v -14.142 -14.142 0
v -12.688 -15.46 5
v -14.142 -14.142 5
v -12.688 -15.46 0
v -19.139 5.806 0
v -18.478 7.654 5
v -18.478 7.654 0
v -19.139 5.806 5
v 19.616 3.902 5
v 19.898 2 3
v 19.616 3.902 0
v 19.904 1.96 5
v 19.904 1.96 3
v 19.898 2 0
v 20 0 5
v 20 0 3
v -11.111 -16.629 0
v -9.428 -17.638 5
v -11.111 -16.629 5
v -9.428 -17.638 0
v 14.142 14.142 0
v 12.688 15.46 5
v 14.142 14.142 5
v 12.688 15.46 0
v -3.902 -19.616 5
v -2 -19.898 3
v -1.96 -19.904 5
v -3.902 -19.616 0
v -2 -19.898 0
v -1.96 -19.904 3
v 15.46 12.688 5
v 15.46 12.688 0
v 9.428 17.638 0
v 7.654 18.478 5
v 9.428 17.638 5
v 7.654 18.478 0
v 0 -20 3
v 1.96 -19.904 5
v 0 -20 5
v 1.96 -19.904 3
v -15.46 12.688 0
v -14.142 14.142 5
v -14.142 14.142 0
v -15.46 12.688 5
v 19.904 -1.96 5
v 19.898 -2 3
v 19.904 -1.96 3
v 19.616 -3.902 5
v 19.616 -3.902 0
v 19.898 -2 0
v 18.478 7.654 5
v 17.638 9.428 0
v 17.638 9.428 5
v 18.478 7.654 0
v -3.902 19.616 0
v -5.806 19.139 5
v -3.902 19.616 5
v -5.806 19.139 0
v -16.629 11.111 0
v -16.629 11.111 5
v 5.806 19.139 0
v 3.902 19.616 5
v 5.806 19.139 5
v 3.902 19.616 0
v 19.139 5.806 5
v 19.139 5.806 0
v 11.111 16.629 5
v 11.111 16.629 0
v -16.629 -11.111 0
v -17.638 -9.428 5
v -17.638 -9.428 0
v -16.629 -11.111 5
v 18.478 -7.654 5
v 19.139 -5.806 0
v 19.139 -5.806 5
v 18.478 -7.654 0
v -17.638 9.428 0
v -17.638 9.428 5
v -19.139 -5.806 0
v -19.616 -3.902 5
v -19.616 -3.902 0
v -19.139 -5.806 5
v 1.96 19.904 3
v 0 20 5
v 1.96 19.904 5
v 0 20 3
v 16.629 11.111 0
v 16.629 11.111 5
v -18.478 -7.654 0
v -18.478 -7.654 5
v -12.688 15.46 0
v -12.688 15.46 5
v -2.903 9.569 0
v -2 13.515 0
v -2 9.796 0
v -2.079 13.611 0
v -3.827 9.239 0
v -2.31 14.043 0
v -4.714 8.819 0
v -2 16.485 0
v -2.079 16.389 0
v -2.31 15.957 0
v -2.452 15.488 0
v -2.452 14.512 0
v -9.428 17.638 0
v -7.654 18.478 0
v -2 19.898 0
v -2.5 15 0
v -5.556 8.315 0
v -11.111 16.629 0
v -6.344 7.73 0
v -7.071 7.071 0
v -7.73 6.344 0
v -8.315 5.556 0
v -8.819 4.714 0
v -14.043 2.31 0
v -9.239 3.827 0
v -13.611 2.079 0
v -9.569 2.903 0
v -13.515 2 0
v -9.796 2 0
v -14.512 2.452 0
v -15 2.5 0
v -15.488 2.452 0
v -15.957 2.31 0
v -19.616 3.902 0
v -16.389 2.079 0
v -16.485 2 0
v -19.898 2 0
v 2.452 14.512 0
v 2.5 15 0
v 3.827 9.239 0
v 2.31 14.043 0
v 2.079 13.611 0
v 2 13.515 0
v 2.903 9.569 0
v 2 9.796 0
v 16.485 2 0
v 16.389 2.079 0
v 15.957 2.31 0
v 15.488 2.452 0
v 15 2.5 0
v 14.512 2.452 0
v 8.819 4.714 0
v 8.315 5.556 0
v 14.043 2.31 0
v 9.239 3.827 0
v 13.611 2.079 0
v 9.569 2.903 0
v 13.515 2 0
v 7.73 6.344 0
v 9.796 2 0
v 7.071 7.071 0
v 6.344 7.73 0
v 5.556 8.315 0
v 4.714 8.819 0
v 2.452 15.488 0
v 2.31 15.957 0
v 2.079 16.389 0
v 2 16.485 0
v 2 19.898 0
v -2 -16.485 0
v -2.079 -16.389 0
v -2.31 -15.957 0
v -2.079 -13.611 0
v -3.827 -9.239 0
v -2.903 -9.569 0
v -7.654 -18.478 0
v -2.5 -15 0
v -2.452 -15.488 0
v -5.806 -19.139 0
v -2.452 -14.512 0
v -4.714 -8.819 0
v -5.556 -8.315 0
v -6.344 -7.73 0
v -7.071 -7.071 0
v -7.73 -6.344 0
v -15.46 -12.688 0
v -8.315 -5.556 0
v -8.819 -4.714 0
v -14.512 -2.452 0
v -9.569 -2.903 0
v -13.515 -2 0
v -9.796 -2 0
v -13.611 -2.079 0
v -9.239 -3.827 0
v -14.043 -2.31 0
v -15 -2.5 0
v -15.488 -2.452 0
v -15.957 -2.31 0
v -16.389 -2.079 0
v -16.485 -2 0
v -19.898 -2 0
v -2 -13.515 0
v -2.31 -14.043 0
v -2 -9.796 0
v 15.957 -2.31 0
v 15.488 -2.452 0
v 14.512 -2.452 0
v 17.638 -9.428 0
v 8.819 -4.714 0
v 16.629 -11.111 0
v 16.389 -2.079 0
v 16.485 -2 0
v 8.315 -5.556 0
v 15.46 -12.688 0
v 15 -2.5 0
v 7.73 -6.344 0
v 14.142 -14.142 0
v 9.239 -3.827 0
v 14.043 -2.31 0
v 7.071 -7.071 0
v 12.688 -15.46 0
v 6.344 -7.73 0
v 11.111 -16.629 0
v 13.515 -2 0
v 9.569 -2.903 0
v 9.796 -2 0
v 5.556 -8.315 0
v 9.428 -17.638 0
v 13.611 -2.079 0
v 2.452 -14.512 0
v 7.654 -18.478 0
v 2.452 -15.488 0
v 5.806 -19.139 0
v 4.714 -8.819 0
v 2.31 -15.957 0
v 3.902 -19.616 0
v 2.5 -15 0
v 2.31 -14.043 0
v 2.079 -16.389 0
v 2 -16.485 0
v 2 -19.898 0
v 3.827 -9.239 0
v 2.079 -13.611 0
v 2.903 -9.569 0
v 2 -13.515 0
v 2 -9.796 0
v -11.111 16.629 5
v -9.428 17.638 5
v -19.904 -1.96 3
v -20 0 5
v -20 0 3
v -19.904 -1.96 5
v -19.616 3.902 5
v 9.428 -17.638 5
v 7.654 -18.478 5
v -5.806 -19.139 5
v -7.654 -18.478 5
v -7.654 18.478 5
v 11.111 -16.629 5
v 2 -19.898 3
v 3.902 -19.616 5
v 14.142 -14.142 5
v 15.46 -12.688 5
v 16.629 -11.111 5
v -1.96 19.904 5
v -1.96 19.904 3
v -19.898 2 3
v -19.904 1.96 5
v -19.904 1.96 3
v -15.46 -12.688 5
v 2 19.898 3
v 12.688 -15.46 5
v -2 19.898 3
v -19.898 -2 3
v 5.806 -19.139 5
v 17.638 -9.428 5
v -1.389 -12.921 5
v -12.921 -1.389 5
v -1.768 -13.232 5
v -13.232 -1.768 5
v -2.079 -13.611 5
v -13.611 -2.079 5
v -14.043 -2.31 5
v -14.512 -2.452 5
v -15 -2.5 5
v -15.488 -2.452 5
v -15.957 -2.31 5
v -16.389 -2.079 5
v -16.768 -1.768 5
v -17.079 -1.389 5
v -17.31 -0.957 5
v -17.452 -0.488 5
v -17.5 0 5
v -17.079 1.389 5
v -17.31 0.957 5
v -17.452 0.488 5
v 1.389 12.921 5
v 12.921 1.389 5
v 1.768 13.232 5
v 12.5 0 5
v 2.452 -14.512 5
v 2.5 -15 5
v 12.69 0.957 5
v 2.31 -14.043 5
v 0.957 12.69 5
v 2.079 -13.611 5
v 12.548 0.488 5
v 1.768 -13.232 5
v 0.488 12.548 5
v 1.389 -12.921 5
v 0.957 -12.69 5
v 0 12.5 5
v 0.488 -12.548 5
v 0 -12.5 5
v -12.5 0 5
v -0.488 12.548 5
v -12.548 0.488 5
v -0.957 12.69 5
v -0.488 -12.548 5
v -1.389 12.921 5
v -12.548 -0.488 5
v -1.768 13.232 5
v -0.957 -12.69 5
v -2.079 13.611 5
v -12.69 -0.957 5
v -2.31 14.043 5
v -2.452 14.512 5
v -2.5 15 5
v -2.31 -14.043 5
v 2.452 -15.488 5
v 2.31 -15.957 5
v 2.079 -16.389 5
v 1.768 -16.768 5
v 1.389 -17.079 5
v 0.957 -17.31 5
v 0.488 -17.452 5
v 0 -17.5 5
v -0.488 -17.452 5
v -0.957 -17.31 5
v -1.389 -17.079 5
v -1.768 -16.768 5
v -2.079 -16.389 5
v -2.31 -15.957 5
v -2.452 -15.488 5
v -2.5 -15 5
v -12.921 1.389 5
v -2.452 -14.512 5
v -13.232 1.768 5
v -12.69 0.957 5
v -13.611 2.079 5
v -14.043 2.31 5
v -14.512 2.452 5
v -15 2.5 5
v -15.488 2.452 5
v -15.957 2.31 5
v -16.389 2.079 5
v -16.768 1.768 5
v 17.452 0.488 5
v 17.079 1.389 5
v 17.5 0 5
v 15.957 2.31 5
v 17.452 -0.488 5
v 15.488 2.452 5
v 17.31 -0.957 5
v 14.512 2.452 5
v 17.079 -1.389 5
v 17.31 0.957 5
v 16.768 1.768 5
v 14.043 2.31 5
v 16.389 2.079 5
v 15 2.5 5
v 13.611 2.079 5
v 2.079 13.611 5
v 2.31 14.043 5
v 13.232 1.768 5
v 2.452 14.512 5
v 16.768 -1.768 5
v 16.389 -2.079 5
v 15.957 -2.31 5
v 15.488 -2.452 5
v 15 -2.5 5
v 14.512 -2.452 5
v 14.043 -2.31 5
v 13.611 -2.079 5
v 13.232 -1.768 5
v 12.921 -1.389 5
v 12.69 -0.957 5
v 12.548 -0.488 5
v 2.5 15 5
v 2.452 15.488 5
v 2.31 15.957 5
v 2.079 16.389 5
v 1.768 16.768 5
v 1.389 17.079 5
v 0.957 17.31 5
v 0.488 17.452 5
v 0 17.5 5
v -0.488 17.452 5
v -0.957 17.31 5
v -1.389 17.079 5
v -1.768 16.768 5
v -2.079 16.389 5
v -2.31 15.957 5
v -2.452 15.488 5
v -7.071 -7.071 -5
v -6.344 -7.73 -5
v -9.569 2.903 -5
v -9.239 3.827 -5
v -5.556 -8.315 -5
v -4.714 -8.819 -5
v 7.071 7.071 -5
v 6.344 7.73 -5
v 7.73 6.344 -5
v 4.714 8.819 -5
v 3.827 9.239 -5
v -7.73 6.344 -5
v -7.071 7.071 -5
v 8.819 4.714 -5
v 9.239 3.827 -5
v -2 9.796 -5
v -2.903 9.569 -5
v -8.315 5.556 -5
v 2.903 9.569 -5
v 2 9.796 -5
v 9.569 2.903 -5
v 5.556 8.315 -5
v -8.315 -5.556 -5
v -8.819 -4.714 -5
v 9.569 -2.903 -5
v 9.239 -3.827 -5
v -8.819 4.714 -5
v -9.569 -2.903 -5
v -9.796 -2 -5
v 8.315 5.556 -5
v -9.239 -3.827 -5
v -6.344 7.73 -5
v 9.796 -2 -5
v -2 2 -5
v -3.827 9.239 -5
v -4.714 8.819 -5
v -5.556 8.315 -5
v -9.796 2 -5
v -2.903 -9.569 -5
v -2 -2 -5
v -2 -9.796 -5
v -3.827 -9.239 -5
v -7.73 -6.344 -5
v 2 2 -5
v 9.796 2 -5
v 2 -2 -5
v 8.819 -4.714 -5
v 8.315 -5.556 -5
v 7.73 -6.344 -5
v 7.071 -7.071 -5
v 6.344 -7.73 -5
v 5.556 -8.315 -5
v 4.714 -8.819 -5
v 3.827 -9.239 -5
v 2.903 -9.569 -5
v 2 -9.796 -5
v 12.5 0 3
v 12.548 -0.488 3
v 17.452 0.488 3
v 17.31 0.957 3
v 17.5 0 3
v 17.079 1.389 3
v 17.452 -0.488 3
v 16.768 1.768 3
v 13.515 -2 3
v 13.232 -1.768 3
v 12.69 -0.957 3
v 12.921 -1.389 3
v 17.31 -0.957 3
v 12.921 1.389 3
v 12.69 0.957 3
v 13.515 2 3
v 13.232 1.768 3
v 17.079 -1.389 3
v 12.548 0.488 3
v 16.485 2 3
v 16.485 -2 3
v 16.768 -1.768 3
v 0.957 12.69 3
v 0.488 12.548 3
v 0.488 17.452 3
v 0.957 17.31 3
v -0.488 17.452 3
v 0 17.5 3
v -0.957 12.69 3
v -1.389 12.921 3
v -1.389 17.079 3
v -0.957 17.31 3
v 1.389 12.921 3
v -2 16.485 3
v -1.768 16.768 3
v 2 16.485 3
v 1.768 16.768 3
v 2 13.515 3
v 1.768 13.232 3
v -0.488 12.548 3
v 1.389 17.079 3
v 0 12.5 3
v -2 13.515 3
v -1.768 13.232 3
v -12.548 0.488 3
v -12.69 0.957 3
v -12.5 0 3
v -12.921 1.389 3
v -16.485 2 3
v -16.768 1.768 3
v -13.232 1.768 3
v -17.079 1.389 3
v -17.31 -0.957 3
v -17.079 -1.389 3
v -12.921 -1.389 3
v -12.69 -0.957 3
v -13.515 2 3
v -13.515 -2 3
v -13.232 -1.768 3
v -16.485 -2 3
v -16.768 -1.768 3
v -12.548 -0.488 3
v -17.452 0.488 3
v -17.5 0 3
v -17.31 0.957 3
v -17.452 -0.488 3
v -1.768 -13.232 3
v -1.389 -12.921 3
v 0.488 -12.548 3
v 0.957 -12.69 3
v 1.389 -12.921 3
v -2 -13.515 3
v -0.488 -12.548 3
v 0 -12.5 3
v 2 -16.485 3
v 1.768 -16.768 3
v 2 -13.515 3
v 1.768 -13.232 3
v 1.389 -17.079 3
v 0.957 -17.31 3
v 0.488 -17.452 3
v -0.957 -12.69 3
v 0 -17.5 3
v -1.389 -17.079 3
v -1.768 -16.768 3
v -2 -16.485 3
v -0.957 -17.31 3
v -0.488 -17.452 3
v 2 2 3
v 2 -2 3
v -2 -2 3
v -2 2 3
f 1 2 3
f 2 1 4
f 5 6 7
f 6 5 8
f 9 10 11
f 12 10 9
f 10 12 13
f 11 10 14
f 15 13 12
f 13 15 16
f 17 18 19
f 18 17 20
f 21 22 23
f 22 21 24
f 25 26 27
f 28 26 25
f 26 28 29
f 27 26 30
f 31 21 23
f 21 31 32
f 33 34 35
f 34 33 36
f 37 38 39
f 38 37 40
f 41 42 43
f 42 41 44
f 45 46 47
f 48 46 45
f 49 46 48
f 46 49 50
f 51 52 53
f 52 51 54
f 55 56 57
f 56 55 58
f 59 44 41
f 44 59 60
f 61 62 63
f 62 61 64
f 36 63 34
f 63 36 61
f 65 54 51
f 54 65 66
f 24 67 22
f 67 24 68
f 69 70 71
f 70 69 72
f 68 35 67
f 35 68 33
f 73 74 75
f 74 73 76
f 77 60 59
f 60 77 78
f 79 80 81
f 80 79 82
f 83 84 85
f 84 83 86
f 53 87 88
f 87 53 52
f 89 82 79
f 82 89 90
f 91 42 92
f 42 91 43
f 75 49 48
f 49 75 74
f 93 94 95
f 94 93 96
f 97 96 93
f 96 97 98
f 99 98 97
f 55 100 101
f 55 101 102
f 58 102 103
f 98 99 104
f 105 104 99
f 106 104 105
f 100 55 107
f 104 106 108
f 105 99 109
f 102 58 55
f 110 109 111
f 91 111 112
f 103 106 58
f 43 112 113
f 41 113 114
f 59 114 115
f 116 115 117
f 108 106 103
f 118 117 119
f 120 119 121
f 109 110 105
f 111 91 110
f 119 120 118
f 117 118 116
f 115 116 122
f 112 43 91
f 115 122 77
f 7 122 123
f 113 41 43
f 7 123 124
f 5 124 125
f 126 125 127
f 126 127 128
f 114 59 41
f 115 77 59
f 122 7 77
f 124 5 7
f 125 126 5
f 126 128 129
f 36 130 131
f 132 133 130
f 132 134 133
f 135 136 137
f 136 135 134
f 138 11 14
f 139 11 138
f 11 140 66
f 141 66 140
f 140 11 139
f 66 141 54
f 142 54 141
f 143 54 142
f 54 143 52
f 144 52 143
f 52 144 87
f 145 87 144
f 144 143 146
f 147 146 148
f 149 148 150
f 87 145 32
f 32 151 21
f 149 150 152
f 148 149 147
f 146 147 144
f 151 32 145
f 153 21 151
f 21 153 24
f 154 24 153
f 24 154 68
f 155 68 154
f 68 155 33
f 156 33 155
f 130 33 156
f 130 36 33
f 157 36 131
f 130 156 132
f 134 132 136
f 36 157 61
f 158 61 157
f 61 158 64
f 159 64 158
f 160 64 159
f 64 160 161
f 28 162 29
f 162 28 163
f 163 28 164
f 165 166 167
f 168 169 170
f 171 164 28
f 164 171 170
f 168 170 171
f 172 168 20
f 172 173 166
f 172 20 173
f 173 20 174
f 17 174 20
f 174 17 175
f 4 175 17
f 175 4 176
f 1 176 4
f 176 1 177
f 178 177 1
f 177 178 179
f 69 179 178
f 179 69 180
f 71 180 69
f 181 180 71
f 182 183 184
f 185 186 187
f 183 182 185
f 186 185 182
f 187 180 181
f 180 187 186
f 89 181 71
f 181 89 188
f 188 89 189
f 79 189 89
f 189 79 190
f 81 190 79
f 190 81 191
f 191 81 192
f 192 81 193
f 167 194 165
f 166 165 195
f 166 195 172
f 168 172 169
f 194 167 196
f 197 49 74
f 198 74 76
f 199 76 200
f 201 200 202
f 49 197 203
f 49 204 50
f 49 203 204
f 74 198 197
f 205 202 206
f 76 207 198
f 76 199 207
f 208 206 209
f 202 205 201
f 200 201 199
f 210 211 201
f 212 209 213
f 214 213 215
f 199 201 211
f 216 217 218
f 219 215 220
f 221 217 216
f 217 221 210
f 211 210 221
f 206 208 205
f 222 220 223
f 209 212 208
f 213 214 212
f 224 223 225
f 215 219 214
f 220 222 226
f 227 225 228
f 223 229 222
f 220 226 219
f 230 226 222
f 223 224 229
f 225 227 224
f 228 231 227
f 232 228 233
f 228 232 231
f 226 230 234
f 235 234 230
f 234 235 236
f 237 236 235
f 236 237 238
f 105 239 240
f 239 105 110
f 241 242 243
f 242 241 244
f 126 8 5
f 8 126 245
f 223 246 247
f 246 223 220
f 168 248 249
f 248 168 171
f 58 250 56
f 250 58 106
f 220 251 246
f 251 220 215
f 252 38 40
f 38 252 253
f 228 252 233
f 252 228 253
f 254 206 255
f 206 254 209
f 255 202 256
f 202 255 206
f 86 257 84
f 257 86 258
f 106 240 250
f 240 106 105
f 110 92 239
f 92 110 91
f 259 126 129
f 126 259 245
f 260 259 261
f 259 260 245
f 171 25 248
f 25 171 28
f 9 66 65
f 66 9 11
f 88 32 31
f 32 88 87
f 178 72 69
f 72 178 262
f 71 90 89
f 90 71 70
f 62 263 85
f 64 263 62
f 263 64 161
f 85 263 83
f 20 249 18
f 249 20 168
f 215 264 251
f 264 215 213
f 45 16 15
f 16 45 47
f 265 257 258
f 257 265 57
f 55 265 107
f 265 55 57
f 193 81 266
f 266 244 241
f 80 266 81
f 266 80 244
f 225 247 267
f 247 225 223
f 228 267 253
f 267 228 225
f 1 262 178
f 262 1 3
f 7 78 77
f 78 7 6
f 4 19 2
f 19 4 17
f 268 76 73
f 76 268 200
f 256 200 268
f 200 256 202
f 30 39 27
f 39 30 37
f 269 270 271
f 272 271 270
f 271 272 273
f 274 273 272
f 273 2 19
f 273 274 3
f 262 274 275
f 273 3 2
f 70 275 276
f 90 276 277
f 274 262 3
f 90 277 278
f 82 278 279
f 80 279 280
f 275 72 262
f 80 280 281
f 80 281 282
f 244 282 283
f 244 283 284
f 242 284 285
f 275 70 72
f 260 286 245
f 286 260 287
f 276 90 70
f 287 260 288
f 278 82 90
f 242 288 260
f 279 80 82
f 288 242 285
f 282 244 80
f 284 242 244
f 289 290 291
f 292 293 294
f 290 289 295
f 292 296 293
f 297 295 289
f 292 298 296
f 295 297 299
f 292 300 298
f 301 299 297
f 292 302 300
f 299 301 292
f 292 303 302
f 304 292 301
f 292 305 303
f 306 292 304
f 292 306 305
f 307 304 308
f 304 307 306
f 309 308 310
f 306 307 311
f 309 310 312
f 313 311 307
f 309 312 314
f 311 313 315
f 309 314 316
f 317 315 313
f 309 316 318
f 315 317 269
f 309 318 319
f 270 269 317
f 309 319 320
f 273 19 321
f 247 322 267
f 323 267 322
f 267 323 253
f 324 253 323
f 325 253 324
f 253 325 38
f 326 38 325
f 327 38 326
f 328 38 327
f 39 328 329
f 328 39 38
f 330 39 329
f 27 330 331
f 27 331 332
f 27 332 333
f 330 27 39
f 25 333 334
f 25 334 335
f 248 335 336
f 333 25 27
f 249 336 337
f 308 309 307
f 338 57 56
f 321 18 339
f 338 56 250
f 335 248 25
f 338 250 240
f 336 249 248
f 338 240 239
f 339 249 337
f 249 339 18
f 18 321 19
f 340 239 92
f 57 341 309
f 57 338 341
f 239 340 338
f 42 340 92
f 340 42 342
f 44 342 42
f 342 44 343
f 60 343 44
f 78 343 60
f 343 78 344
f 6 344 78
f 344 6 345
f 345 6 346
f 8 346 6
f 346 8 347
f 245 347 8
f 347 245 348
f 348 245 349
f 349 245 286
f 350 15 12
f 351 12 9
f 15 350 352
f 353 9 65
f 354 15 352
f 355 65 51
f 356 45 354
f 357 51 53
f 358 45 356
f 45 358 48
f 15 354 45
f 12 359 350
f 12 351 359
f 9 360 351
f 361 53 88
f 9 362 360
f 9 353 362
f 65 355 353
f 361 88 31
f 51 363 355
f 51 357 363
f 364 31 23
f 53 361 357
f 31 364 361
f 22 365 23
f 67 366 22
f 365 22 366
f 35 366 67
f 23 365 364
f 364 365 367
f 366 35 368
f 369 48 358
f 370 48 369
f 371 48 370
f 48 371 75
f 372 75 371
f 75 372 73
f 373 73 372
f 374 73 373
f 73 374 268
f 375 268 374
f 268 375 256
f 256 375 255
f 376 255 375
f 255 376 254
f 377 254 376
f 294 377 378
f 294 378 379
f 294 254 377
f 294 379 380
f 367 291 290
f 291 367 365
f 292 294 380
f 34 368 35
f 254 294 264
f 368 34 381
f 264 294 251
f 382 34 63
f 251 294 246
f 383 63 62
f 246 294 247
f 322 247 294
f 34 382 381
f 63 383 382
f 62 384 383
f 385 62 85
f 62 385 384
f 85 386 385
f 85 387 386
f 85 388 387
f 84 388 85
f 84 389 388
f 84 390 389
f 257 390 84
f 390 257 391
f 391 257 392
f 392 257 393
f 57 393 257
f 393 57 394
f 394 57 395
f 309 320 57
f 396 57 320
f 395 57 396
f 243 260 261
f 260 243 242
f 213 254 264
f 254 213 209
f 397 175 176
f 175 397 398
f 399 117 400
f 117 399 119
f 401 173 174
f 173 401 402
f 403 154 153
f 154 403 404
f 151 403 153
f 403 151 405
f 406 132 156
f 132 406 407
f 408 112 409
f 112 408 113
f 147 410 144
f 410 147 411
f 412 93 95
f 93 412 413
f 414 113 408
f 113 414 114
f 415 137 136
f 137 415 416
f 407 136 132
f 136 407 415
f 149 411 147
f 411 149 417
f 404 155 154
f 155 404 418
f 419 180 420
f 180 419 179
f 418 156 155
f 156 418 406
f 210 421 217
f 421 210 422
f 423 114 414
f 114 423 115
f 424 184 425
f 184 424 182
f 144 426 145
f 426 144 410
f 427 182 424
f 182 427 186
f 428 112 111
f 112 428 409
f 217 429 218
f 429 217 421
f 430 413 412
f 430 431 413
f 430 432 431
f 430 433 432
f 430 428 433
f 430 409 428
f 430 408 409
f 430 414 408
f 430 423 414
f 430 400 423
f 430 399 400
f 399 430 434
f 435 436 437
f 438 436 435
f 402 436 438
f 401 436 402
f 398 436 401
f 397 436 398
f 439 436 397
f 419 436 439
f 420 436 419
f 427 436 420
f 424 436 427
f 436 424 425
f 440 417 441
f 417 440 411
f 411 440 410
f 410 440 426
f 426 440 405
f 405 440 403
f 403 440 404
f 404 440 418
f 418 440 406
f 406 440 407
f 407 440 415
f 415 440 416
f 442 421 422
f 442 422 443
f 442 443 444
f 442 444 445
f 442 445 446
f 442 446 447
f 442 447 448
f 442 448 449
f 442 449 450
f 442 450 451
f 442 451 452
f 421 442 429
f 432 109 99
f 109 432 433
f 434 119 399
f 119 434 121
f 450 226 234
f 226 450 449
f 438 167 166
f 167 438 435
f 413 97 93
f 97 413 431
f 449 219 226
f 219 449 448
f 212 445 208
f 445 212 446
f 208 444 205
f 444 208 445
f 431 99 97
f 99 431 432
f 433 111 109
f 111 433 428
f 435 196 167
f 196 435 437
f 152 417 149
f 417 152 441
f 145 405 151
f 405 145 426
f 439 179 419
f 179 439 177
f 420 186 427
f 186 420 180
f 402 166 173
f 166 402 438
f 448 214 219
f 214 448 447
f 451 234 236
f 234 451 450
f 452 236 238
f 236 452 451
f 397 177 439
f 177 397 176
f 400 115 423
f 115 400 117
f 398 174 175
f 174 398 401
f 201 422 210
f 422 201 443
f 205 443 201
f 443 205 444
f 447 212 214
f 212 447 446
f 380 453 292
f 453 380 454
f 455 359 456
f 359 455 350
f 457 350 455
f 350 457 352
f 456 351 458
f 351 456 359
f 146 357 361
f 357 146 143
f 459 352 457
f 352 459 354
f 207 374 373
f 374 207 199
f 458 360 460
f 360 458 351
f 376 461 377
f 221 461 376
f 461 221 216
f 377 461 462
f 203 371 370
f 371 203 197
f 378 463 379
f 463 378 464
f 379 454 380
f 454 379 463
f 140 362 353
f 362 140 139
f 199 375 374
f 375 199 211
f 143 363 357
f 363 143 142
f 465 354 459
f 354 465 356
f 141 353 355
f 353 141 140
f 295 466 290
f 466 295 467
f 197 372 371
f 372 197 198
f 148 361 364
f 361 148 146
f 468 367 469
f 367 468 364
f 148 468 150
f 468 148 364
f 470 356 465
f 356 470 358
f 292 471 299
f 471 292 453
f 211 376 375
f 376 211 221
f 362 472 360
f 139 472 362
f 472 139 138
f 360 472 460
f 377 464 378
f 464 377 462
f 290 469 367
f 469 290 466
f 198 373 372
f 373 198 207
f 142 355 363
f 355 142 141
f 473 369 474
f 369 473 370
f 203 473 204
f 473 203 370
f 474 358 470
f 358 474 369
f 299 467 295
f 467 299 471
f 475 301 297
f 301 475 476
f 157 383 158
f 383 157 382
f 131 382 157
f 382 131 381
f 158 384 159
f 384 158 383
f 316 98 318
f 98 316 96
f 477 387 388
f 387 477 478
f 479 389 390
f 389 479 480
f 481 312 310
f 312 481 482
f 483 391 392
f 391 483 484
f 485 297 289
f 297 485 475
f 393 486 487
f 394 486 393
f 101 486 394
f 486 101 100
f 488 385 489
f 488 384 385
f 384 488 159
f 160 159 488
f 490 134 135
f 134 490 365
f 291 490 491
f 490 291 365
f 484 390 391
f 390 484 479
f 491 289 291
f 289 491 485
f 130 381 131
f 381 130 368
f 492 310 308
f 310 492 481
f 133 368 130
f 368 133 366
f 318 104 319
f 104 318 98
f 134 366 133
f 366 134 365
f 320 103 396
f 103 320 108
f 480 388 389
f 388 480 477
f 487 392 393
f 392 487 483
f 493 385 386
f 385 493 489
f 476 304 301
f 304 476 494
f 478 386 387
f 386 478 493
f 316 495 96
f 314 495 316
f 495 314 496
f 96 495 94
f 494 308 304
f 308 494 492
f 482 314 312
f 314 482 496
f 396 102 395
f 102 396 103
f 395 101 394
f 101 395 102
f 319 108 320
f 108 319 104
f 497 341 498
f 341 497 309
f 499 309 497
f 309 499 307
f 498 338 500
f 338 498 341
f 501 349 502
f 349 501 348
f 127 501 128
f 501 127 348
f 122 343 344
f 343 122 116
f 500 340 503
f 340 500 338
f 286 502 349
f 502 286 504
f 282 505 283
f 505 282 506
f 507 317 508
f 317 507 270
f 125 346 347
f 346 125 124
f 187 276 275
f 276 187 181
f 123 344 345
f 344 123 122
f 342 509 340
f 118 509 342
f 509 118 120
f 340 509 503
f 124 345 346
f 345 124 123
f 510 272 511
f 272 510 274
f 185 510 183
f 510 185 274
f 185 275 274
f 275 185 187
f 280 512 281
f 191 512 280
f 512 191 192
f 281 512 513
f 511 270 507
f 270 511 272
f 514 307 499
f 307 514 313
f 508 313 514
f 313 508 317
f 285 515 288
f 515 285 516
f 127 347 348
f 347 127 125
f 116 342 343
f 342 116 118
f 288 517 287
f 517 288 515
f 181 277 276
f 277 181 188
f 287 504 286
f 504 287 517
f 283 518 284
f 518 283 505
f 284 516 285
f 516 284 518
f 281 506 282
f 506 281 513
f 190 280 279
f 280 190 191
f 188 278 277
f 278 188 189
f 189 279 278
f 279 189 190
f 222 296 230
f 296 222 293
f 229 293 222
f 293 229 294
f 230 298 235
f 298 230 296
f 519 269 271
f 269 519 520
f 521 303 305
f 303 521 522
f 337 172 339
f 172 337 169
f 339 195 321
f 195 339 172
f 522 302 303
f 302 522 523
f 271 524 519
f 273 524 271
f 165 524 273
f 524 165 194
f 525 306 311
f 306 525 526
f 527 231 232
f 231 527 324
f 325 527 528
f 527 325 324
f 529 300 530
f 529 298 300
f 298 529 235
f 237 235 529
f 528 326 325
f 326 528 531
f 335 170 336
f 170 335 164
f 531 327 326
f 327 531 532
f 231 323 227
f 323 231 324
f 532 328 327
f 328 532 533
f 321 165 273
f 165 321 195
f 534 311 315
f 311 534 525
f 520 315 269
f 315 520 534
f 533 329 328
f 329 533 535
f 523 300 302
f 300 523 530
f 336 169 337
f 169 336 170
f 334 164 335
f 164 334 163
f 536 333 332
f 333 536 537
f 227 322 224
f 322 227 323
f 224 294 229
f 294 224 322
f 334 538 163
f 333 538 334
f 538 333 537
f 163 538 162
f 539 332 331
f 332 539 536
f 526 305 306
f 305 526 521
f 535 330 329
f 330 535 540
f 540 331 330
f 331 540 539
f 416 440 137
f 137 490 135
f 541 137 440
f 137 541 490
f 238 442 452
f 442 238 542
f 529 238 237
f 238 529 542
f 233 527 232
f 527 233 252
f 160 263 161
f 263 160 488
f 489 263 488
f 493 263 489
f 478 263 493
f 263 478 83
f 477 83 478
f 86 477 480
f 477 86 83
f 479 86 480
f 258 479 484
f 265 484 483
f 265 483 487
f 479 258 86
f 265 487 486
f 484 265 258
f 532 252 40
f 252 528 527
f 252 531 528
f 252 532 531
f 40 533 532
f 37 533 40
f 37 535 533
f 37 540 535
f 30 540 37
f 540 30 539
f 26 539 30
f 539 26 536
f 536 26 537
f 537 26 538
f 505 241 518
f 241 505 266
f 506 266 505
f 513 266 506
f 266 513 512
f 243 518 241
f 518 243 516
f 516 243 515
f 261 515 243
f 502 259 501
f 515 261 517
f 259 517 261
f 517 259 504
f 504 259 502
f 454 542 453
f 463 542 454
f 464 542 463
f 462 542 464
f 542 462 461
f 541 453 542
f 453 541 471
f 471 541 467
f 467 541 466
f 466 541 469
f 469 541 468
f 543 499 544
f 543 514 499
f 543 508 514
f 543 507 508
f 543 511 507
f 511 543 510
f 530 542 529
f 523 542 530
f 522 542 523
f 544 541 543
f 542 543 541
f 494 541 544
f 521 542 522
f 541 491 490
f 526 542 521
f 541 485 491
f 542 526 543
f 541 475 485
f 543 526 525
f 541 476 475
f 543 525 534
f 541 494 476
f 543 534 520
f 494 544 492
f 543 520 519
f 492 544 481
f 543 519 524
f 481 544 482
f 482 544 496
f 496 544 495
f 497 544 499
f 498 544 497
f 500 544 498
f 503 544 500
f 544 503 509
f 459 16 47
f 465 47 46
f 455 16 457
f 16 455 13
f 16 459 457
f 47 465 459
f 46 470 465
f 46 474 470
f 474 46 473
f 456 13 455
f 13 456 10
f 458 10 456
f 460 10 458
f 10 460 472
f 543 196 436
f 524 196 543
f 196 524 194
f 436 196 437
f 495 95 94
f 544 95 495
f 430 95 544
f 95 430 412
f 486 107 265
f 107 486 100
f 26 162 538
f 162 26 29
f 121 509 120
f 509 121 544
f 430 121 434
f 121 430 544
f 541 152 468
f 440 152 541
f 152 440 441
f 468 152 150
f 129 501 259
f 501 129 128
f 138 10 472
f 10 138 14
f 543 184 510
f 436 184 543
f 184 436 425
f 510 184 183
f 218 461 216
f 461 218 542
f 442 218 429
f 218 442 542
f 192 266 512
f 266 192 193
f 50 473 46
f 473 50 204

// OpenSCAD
lid_diameter = 40;
lid_thickness = 5;
bung_diameter = 20;
bung_height = 5;
slot_width = 4;
groove_depth = 3;

drain_hole_diameter = 5;
drain_hole_ring_radius = 15;

difference() {
    union() {
        cylinder(h = lid_thickness, d = lid_diameter, $fn = 64);
        translate([0, 0, -bung_height])
            cylinder(h = bung_height, d = bung_diameter, $fn = 64);
    }
    // Crossed grooves across full underside of lid + through bung
    translate([-slot_width/2, -lid_diameter/2, -bung_height])
        cube([slot_width, lid_diameter, bung_height + groove_depth]);
    translate([-lid_diameter/2, -slot_width/2, -bung_height])
        cube([lid_diameter, slot_width, bung_height + groove_depth]);
    // 4 drain holes aligned with slots at 45 degrees into each quadrant
    for (i = [0 : 3]) {
        angle =  i * 90;
        translate([
            drain_hole_ring_radius * cos(angle),
            drain_hole_ring_radius * sin(angle),
            -bung_height
        ])
        cylinder(h = lid_thickness + bung_height, d = drain_hole_diameter, $fn = 32);
    }
}
